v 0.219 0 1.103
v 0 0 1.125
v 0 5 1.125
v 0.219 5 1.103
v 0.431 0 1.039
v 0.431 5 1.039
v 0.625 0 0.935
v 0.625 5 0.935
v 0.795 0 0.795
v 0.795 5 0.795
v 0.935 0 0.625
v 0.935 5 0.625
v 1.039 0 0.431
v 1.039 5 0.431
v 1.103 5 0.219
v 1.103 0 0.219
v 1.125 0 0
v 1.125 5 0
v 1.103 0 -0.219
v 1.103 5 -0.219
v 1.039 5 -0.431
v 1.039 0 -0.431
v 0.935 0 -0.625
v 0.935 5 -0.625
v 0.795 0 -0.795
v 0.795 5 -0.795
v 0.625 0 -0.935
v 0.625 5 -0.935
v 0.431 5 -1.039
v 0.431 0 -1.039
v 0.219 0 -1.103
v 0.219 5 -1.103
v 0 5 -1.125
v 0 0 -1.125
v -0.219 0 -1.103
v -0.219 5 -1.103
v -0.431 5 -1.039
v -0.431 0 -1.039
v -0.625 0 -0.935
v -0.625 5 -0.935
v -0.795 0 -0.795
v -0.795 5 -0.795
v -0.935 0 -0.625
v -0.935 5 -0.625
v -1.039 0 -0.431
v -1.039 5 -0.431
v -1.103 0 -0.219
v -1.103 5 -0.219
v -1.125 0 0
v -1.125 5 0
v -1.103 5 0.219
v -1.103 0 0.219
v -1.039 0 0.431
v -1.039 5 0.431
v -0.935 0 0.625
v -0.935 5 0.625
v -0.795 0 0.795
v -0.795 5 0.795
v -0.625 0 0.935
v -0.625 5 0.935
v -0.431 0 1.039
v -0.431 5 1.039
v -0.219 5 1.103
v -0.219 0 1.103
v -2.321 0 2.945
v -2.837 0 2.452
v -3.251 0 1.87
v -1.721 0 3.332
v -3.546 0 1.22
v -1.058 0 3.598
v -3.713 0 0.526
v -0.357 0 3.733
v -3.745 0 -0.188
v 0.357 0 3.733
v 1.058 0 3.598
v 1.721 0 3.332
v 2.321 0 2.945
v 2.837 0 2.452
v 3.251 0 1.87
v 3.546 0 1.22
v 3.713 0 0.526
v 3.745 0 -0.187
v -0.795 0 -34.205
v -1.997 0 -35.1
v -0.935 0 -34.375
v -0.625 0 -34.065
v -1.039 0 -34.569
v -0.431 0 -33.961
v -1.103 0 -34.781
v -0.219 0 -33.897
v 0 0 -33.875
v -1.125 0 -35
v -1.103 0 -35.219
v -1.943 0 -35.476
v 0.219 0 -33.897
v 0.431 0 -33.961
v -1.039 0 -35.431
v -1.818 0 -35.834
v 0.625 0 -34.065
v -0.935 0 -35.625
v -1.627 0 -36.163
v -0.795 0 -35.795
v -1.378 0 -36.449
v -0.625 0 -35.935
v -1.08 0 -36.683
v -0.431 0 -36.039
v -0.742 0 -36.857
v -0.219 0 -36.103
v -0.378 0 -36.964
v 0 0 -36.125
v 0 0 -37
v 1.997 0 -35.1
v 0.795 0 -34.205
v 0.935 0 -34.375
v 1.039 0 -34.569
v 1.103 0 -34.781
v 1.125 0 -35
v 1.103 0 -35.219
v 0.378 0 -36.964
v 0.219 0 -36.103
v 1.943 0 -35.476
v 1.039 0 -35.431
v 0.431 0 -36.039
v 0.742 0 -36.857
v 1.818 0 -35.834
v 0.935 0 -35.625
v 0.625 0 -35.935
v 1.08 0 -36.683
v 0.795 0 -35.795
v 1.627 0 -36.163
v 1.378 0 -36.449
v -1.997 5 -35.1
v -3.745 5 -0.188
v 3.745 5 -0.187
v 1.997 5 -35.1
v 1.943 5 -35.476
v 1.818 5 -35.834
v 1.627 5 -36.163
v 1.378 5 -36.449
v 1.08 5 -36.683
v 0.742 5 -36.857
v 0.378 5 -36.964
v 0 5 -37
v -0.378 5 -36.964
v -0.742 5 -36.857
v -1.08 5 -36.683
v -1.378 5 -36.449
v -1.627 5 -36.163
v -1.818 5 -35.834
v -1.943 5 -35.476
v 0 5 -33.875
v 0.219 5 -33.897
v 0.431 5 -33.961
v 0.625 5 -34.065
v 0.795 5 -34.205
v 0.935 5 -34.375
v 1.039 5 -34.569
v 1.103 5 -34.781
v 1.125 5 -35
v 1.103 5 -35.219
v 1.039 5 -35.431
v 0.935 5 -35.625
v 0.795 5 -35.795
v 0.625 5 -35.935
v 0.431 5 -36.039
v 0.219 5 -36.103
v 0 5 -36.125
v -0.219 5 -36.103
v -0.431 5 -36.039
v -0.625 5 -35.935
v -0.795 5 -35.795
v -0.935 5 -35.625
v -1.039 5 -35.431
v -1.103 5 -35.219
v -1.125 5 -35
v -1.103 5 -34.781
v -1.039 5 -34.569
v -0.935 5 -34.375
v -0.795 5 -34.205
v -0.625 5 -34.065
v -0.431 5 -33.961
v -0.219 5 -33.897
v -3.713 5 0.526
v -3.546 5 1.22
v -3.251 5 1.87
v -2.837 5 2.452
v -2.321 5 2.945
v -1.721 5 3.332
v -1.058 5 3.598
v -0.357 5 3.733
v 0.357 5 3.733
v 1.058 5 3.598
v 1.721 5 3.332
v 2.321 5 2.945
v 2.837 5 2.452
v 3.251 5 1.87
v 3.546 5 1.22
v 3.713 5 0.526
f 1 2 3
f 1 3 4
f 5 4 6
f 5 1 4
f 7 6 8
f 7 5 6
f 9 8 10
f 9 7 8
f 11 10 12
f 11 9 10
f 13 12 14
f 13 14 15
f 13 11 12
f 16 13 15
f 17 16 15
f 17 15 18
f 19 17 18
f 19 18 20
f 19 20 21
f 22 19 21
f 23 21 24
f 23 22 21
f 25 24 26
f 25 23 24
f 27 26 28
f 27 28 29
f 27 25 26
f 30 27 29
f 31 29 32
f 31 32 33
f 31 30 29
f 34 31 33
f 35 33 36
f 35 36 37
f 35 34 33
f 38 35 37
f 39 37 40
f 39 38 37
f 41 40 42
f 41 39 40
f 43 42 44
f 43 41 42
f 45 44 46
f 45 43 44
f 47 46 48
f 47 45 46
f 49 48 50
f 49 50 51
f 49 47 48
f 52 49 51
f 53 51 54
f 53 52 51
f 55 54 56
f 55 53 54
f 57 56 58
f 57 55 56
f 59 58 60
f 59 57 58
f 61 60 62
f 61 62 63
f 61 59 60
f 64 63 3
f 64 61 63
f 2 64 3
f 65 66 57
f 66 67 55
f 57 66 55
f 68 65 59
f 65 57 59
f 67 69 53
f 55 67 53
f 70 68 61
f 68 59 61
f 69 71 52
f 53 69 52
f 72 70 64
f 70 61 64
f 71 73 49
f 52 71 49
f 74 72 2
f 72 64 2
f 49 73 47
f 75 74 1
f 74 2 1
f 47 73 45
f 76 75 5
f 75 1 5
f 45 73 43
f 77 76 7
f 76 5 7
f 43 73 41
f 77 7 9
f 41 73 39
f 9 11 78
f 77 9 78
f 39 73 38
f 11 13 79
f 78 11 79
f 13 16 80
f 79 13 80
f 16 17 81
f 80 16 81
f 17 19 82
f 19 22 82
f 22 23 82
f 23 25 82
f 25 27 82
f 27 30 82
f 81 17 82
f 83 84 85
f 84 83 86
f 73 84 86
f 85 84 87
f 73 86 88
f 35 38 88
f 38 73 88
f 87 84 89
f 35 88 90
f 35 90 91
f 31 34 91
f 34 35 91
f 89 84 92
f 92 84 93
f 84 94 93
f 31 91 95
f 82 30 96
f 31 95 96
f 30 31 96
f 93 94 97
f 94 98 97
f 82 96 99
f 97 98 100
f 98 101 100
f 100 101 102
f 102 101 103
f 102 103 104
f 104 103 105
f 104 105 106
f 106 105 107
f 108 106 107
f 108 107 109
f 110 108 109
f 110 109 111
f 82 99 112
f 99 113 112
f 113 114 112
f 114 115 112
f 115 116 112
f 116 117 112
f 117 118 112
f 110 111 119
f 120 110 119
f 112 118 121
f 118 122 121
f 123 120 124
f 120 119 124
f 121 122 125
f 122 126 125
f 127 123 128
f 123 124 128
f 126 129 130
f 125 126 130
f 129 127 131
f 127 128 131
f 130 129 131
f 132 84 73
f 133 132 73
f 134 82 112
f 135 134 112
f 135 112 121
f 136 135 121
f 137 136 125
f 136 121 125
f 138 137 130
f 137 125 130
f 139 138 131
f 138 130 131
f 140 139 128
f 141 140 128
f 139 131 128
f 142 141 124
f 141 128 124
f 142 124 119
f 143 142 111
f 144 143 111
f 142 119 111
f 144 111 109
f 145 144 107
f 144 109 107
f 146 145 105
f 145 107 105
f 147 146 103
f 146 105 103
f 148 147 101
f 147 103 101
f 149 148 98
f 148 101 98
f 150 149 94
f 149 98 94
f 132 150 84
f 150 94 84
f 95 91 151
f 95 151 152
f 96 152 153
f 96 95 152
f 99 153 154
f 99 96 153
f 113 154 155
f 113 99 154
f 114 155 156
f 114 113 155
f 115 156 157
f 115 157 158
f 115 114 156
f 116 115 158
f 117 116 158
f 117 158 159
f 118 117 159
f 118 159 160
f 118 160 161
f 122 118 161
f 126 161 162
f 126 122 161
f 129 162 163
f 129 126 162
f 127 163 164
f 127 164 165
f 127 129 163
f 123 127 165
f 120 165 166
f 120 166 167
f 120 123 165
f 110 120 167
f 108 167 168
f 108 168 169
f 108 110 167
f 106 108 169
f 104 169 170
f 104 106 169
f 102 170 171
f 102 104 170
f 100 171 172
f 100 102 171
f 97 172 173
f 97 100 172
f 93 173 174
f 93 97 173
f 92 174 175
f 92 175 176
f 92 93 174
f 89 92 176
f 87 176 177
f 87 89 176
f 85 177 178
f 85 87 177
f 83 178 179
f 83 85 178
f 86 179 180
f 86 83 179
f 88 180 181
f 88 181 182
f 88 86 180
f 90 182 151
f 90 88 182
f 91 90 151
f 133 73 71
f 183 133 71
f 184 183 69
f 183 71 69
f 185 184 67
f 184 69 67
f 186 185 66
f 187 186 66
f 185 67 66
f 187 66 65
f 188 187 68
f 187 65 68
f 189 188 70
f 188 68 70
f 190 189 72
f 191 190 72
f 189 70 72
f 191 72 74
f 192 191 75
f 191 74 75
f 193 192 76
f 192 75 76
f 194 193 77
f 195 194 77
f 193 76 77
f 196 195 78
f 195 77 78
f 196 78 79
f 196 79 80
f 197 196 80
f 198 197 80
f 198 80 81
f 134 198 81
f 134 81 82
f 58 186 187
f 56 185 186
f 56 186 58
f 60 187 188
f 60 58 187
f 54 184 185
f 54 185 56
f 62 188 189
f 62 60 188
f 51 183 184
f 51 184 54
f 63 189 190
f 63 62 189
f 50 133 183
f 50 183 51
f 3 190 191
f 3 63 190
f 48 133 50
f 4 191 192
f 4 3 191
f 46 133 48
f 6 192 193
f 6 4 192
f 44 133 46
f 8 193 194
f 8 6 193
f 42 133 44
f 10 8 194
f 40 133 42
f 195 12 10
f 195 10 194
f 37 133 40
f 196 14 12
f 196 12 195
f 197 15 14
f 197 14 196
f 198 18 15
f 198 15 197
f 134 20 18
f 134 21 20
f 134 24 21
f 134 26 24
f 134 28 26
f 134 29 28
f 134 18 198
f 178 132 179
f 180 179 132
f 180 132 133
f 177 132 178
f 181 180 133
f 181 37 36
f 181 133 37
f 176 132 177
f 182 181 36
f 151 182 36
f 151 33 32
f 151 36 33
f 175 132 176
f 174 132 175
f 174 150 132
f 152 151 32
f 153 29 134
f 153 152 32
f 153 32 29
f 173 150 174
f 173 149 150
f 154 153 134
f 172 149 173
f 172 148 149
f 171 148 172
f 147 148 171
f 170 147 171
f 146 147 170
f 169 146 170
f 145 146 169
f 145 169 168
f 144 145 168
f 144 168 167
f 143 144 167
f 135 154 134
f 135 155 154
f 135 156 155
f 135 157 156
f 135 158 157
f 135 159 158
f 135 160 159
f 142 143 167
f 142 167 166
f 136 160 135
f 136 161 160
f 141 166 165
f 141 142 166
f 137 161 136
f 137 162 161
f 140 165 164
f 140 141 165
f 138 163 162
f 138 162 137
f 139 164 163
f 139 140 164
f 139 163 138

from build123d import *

# Parameters (mm, degrees)
SKETCH1_R           = 1.125
BOSS_EXTRUDE1_DEPTH = 5


with BuildPart() as part:
    # Sketch1 → Boss-Extrude1 (new body)
    with BuildSketch(Plane(origin=(0, 0, 0), x_dir=(1, 0, 0), z_dir=(0, 1, 0))):
        with BuildLine():
            ThreePointArc((-3.745309567, 0.1875), (0, -3.75), (3.745309567, 0.1875))
            Line((3.745309567, 0.1875), (1.997498436, 35.1))
            ThreePointArc((1.997498436, 35.1), (0, 37), (-1.997498436, 35.1))
            Line((-1.997498436, 35.1), (-3.745309567, 0.1875))
        make_face()
        with Locations(Location((0, 0, 0), (0, 0, 270))):
            Circle(SKETCH1_R, mode=Mode.SUBTRACT)
        with Locations(Location((0, 35, 0), (0, 0, 270))):
            Circle(SKETCH1_R, mode=Mode.SUBTRACT)
    extrude(amount=BOSS_EXTRUDE1_DEPTH)


solid = part.part
